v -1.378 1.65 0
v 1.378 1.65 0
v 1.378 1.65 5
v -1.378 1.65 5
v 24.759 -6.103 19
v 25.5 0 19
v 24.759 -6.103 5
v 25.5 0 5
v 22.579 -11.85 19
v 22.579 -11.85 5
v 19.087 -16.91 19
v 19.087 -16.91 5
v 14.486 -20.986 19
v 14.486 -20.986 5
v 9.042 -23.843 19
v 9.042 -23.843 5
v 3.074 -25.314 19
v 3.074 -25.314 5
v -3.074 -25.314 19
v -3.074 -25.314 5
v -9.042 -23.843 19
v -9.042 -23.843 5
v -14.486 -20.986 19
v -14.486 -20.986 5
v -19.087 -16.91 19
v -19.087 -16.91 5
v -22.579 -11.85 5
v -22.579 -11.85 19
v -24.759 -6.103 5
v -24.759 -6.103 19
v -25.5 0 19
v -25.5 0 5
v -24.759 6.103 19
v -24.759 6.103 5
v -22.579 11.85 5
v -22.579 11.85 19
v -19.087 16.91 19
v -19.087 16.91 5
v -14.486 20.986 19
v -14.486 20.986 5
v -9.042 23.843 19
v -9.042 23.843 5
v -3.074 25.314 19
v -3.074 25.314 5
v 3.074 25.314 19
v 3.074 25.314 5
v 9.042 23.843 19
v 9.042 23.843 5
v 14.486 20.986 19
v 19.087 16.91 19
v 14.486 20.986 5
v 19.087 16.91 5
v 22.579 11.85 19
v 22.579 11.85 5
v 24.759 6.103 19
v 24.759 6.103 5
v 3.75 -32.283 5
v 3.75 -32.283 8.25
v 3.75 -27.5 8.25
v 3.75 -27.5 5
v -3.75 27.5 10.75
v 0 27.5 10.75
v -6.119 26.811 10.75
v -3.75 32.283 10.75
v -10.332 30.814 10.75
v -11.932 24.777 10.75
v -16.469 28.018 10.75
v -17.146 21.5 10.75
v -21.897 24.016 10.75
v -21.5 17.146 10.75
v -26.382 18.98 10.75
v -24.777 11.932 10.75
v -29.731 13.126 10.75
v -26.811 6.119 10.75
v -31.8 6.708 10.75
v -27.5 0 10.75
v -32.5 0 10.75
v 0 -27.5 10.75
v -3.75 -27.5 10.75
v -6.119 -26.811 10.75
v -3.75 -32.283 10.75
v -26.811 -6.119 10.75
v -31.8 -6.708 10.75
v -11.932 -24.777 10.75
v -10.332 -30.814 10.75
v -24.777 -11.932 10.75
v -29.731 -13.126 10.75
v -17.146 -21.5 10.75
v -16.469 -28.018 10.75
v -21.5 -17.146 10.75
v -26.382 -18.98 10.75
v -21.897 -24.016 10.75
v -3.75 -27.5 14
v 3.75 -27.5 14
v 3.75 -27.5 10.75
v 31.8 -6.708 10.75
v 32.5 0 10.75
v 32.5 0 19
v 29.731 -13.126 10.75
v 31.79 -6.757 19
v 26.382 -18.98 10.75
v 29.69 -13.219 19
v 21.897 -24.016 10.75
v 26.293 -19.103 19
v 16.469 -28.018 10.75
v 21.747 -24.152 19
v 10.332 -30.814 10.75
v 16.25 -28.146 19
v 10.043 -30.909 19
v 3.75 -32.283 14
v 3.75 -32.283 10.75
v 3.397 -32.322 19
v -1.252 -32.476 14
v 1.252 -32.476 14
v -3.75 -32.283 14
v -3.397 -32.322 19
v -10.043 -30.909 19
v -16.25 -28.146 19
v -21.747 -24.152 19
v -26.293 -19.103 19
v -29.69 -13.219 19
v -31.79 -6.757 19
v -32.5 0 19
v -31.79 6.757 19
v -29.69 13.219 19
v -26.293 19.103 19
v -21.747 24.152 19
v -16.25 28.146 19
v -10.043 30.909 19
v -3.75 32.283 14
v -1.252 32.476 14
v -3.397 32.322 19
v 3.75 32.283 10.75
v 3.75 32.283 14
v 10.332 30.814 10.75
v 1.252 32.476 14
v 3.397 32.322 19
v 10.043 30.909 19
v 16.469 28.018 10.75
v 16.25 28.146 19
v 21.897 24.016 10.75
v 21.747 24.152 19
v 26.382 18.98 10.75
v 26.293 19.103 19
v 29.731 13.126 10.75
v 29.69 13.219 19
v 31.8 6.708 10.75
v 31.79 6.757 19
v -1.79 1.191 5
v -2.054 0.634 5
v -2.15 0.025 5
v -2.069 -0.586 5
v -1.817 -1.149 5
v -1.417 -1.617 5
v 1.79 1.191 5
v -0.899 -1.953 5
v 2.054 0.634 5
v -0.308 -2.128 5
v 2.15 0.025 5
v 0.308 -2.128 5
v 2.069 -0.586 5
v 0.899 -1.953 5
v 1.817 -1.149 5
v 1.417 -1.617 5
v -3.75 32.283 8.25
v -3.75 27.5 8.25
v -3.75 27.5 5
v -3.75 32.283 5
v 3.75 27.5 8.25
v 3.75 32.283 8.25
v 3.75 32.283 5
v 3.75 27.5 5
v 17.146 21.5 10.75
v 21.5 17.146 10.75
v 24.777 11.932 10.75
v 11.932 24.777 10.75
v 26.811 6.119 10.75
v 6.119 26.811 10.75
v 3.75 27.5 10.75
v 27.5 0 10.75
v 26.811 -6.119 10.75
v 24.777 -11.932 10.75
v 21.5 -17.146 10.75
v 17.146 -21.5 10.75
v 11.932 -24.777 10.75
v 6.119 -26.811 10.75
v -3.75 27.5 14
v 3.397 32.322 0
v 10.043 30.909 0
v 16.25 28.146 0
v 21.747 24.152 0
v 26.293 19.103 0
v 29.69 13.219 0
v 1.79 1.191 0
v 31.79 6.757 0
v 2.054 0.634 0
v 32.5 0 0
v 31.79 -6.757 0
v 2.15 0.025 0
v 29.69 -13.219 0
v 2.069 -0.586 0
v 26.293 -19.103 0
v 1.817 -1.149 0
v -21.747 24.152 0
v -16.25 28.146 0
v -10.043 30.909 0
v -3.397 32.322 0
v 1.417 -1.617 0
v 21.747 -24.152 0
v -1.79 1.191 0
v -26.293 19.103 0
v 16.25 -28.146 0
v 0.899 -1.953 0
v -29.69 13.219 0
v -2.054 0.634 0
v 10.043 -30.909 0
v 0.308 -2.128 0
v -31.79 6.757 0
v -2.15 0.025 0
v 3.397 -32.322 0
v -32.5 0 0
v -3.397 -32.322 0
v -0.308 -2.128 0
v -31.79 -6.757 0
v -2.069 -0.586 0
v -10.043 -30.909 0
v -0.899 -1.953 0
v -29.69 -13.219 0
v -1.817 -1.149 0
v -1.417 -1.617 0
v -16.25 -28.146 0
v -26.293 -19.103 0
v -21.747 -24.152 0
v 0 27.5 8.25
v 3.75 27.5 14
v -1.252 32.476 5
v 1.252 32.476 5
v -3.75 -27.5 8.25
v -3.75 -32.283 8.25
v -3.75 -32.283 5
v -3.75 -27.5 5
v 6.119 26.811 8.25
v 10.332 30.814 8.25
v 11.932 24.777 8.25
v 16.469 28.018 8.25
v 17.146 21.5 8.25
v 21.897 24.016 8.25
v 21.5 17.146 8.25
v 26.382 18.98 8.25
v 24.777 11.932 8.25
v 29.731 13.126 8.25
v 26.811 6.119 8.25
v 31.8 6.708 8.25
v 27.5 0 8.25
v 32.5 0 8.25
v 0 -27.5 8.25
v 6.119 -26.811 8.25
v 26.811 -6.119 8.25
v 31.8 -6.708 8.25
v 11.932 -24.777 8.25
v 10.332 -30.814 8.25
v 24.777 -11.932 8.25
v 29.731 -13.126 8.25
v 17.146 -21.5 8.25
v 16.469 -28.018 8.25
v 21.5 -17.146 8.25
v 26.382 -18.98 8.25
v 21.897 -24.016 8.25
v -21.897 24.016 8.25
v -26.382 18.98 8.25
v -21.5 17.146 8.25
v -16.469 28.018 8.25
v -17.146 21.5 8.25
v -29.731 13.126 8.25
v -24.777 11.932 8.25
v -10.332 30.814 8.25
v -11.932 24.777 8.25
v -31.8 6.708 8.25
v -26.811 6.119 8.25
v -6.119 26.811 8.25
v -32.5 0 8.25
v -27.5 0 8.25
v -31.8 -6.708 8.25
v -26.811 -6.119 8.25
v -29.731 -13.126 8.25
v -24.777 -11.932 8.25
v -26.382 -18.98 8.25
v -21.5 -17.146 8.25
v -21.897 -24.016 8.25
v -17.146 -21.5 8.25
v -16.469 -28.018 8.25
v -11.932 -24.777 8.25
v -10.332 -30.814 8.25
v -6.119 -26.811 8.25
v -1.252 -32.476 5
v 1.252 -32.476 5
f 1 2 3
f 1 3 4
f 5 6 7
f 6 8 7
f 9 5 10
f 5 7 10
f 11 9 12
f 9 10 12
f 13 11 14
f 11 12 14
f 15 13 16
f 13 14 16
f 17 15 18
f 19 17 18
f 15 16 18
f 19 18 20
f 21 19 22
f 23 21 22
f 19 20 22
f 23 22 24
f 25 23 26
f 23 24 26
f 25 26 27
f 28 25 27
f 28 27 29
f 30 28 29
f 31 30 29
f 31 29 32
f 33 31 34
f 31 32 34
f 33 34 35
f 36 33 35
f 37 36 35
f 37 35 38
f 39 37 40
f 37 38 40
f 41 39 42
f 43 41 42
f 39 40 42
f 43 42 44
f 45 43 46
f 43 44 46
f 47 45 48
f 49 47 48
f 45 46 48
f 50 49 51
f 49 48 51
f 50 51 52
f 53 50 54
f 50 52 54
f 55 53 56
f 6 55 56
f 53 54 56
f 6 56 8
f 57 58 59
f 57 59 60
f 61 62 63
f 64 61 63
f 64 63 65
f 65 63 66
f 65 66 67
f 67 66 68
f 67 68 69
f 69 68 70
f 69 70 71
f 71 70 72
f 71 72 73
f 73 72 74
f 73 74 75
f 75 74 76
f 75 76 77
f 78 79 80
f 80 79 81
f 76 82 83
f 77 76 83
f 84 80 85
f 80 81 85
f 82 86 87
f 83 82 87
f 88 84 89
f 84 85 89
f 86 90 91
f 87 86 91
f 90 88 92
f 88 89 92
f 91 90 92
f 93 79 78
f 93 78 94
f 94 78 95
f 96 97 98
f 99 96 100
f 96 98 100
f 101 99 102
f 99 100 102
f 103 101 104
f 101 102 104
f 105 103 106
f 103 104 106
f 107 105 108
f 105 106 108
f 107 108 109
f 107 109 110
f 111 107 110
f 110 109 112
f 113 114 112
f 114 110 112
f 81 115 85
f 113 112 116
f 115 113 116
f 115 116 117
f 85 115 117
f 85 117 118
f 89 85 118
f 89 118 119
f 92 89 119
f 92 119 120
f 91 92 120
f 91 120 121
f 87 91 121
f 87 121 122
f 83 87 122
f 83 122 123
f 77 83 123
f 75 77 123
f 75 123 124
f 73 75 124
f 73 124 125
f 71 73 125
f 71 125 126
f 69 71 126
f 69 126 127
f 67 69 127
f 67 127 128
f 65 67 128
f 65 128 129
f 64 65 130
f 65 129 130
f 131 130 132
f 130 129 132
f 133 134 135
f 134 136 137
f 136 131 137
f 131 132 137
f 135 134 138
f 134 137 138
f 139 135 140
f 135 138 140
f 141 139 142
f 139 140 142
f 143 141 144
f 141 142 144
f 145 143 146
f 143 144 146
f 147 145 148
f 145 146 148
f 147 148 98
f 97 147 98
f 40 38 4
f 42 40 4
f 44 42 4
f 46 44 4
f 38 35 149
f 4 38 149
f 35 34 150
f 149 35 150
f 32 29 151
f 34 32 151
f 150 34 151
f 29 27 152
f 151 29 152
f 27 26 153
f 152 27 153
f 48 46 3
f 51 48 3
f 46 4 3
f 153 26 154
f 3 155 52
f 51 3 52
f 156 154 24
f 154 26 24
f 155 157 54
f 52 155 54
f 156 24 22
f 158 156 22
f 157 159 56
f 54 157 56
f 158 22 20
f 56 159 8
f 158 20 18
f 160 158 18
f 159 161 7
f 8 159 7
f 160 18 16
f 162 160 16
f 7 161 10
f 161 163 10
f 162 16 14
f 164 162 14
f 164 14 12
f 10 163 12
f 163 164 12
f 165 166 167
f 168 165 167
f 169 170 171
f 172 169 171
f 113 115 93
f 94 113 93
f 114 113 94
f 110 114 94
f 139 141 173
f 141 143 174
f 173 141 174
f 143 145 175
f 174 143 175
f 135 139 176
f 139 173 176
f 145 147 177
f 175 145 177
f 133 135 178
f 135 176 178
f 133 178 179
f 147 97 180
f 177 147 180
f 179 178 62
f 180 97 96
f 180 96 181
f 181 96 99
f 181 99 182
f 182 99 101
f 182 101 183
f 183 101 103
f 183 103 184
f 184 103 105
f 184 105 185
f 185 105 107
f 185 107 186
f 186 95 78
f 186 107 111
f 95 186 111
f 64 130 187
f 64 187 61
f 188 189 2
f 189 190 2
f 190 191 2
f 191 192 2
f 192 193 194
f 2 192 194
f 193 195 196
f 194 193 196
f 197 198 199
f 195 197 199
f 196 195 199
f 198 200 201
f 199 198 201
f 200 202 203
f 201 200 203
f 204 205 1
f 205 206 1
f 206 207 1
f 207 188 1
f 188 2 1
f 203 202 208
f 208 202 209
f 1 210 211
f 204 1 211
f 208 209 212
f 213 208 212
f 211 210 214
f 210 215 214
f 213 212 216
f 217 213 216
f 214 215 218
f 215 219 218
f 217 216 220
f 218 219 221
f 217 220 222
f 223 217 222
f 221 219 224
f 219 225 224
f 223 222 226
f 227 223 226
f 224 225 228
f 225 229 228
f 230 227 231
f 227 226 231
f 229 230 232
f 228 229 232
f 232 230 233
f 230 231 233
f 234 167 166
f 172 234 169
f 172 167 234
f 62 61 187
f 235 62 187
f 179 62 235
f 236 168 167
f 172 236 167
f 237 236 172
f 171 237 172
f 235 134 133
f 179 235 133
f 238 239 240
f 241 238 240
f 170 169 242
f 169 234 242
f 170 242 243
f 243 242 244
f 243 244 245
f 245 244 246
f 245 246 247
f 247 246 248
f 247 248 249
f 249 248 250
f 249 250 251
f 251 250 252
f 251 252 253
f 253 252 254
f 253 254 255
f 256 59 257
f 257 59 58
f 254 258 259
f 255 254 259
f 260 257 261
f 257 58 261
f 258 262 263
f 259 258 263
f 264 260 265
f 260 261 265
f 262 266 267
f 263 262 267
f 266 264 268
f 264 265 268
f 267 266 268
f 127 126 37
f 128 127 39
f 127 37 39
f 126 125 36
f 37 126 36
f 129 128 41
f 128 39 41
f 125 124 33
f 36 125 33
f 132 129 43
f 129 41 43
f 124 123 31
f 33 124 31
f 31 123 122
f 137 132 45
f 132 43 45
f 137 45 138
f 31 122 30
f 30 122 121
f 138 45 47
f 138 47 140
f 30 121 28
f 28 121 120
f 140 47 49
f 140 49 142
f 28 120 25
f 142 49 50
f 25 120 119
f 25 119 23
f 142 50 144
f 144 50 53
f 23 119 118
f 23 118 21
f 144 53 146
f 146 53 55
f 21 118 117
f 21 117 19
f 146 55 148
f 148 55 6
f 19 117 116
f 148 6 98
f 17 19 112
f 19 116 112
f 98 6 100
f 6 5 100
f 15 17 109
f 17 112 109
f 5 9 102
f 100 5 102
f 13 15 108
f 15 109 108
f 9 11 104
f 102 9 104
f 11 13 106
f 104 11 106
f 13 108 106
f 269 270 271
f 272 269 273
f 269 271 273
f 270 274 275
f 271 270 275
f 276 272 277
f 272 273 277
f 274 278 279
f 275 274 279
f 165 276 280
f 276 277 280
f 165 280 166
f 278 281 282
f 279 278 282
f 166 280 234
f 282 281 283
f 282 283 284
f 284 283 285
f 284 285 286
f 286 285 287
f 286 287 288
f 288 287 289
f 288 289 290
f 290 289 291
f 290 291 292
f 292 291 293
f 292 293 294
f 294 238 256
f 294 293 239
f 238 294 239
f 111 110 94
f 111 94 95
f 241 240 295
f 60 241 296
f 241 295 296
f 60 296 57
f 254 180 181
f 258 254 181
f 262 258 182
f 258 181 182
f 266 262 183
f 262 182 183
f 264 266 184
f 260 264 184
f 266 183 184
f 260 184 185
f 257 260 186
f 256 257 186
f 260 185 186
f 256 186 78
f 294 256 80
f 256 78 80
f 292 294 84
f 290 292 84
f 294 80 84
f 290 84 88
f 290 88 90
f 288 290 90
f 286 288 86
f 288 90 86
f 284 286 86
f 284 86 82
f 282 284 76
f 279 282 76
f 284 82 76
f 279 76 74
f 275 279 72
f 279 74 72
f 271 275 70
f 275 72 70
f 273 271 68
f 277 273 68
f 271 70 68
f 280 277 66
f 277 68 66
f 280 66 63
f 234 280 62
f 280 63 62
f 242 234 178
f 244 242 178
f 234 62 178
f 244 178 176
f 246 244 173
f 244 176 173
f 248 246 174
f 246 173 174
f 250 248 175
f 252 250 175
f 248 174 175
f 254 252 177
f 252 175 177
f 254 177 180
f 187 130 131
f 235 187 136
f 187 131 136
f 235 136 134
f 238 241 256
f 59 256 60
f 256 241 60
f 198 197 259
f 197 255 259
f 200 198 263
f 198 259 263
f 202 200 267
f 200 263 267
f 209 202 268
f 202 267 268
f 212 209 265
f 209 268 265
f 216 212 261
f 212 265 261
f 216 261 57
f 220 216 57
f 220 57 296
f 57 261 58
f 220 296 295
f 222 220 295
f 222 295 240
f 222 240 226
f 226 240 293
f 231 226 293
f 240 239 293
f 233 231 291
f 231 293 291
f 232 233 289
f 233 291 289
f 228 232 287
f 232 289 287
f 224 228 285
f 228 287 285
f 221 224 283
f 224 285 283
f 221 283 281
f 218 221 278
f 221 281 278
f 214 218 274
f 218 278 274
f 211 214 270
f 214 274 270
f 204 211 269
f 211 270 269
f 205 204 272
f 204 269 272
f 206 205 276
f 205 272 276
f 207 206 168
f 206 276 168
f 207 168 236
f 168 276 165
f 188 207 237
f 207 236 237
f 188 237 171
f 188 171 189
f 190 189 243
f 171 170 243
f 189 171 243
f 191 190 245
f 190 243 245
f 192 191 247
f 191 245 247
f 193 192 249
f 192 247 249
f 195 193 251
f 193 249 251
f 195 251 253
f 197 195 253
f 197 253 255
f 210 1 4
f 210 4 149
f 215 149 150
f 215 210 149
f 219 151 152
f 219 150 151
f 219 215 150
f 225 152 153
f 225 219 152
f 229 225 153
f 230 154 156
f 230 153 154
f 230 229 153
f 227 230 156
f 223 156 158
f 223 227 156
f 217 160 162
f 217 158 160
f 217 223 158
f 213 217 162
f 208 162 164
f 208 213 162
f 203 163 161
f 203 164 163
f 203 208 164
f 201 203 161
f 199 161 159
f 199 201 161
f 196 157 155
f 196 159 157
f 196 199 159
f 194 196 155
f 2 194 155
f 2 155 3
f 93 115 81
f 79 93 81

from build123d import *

# Parameters (mm, degrees)
SKETCH7_W          = 7.5
SKETCH7_H          = 9
CUT_EXTRUDE1_DEPTH = 5
SHAFT_HOLE_DEPTH   = 50.734294003


with BuildPart() as part:
    # Sketch2 → Revolve1 (revolve)
    with BuildSketch(Plane(origin=(0, 0, 0), x_dir=(0, 0, -1), z_dir=(1, 0, 0)), mode=Mode.PRIVATE) as revolve1_sk:
        Polygon((0, 0), (0, 32.5), (-8.25, 32.5), (-8.25, 27.5), (-10.75, 27.5), (-10.75, 32.5), (-19, 32.5), (-19, 25.5), (-5, 25.5), (-5, 0), align=None)
    revolve(revolve1_sk.sketch.rotate(Axis((0, 0, 5), (0, 0, -1)), 90), axis=Axis((0, 0, 5), (0, 0, -1)))

    # Sketch7 → Cut-Extrude1 (cut)
    with BuildSketch(Plane(origin=(0, 32.5, 0), x_dir=(1, 0, 0), z_dir=(0, 1, 0))):
        with Locations((0, -9.5)):
            Rectangle(SKETCH7_W, SKETCH7_H)
    cut_extrude1 = extrude(amount=-CUT_EXTRUDE1_DEPTH, mode=Mode.SUBTRACT)

    # Mirror1: Cut-Extrude1 across plane
    add(cut_extrude1.mirror(Plane.ZX), mode=Mode.SUBTRACT)

    # Sketch8 → Shaft Hole (cut, through all)
    with BuildSketch(Plane(origin=(0, 0, 0), x_dir=(-1, 0, 0), z_dir=(0, 0, -1))):
        with BuildLine():
            Line((-1.378404875, 1.65), (1.378404875, 1.65))
            ThreePointArc((1.378404875, 1.65), (0, -2.15), (-1.378404875, 1.65))
        make_face()
    extrude(amount=-SHAFT_HOLE_DEPTH, mode=Mode.SUBTRACT)


solid = part.part
